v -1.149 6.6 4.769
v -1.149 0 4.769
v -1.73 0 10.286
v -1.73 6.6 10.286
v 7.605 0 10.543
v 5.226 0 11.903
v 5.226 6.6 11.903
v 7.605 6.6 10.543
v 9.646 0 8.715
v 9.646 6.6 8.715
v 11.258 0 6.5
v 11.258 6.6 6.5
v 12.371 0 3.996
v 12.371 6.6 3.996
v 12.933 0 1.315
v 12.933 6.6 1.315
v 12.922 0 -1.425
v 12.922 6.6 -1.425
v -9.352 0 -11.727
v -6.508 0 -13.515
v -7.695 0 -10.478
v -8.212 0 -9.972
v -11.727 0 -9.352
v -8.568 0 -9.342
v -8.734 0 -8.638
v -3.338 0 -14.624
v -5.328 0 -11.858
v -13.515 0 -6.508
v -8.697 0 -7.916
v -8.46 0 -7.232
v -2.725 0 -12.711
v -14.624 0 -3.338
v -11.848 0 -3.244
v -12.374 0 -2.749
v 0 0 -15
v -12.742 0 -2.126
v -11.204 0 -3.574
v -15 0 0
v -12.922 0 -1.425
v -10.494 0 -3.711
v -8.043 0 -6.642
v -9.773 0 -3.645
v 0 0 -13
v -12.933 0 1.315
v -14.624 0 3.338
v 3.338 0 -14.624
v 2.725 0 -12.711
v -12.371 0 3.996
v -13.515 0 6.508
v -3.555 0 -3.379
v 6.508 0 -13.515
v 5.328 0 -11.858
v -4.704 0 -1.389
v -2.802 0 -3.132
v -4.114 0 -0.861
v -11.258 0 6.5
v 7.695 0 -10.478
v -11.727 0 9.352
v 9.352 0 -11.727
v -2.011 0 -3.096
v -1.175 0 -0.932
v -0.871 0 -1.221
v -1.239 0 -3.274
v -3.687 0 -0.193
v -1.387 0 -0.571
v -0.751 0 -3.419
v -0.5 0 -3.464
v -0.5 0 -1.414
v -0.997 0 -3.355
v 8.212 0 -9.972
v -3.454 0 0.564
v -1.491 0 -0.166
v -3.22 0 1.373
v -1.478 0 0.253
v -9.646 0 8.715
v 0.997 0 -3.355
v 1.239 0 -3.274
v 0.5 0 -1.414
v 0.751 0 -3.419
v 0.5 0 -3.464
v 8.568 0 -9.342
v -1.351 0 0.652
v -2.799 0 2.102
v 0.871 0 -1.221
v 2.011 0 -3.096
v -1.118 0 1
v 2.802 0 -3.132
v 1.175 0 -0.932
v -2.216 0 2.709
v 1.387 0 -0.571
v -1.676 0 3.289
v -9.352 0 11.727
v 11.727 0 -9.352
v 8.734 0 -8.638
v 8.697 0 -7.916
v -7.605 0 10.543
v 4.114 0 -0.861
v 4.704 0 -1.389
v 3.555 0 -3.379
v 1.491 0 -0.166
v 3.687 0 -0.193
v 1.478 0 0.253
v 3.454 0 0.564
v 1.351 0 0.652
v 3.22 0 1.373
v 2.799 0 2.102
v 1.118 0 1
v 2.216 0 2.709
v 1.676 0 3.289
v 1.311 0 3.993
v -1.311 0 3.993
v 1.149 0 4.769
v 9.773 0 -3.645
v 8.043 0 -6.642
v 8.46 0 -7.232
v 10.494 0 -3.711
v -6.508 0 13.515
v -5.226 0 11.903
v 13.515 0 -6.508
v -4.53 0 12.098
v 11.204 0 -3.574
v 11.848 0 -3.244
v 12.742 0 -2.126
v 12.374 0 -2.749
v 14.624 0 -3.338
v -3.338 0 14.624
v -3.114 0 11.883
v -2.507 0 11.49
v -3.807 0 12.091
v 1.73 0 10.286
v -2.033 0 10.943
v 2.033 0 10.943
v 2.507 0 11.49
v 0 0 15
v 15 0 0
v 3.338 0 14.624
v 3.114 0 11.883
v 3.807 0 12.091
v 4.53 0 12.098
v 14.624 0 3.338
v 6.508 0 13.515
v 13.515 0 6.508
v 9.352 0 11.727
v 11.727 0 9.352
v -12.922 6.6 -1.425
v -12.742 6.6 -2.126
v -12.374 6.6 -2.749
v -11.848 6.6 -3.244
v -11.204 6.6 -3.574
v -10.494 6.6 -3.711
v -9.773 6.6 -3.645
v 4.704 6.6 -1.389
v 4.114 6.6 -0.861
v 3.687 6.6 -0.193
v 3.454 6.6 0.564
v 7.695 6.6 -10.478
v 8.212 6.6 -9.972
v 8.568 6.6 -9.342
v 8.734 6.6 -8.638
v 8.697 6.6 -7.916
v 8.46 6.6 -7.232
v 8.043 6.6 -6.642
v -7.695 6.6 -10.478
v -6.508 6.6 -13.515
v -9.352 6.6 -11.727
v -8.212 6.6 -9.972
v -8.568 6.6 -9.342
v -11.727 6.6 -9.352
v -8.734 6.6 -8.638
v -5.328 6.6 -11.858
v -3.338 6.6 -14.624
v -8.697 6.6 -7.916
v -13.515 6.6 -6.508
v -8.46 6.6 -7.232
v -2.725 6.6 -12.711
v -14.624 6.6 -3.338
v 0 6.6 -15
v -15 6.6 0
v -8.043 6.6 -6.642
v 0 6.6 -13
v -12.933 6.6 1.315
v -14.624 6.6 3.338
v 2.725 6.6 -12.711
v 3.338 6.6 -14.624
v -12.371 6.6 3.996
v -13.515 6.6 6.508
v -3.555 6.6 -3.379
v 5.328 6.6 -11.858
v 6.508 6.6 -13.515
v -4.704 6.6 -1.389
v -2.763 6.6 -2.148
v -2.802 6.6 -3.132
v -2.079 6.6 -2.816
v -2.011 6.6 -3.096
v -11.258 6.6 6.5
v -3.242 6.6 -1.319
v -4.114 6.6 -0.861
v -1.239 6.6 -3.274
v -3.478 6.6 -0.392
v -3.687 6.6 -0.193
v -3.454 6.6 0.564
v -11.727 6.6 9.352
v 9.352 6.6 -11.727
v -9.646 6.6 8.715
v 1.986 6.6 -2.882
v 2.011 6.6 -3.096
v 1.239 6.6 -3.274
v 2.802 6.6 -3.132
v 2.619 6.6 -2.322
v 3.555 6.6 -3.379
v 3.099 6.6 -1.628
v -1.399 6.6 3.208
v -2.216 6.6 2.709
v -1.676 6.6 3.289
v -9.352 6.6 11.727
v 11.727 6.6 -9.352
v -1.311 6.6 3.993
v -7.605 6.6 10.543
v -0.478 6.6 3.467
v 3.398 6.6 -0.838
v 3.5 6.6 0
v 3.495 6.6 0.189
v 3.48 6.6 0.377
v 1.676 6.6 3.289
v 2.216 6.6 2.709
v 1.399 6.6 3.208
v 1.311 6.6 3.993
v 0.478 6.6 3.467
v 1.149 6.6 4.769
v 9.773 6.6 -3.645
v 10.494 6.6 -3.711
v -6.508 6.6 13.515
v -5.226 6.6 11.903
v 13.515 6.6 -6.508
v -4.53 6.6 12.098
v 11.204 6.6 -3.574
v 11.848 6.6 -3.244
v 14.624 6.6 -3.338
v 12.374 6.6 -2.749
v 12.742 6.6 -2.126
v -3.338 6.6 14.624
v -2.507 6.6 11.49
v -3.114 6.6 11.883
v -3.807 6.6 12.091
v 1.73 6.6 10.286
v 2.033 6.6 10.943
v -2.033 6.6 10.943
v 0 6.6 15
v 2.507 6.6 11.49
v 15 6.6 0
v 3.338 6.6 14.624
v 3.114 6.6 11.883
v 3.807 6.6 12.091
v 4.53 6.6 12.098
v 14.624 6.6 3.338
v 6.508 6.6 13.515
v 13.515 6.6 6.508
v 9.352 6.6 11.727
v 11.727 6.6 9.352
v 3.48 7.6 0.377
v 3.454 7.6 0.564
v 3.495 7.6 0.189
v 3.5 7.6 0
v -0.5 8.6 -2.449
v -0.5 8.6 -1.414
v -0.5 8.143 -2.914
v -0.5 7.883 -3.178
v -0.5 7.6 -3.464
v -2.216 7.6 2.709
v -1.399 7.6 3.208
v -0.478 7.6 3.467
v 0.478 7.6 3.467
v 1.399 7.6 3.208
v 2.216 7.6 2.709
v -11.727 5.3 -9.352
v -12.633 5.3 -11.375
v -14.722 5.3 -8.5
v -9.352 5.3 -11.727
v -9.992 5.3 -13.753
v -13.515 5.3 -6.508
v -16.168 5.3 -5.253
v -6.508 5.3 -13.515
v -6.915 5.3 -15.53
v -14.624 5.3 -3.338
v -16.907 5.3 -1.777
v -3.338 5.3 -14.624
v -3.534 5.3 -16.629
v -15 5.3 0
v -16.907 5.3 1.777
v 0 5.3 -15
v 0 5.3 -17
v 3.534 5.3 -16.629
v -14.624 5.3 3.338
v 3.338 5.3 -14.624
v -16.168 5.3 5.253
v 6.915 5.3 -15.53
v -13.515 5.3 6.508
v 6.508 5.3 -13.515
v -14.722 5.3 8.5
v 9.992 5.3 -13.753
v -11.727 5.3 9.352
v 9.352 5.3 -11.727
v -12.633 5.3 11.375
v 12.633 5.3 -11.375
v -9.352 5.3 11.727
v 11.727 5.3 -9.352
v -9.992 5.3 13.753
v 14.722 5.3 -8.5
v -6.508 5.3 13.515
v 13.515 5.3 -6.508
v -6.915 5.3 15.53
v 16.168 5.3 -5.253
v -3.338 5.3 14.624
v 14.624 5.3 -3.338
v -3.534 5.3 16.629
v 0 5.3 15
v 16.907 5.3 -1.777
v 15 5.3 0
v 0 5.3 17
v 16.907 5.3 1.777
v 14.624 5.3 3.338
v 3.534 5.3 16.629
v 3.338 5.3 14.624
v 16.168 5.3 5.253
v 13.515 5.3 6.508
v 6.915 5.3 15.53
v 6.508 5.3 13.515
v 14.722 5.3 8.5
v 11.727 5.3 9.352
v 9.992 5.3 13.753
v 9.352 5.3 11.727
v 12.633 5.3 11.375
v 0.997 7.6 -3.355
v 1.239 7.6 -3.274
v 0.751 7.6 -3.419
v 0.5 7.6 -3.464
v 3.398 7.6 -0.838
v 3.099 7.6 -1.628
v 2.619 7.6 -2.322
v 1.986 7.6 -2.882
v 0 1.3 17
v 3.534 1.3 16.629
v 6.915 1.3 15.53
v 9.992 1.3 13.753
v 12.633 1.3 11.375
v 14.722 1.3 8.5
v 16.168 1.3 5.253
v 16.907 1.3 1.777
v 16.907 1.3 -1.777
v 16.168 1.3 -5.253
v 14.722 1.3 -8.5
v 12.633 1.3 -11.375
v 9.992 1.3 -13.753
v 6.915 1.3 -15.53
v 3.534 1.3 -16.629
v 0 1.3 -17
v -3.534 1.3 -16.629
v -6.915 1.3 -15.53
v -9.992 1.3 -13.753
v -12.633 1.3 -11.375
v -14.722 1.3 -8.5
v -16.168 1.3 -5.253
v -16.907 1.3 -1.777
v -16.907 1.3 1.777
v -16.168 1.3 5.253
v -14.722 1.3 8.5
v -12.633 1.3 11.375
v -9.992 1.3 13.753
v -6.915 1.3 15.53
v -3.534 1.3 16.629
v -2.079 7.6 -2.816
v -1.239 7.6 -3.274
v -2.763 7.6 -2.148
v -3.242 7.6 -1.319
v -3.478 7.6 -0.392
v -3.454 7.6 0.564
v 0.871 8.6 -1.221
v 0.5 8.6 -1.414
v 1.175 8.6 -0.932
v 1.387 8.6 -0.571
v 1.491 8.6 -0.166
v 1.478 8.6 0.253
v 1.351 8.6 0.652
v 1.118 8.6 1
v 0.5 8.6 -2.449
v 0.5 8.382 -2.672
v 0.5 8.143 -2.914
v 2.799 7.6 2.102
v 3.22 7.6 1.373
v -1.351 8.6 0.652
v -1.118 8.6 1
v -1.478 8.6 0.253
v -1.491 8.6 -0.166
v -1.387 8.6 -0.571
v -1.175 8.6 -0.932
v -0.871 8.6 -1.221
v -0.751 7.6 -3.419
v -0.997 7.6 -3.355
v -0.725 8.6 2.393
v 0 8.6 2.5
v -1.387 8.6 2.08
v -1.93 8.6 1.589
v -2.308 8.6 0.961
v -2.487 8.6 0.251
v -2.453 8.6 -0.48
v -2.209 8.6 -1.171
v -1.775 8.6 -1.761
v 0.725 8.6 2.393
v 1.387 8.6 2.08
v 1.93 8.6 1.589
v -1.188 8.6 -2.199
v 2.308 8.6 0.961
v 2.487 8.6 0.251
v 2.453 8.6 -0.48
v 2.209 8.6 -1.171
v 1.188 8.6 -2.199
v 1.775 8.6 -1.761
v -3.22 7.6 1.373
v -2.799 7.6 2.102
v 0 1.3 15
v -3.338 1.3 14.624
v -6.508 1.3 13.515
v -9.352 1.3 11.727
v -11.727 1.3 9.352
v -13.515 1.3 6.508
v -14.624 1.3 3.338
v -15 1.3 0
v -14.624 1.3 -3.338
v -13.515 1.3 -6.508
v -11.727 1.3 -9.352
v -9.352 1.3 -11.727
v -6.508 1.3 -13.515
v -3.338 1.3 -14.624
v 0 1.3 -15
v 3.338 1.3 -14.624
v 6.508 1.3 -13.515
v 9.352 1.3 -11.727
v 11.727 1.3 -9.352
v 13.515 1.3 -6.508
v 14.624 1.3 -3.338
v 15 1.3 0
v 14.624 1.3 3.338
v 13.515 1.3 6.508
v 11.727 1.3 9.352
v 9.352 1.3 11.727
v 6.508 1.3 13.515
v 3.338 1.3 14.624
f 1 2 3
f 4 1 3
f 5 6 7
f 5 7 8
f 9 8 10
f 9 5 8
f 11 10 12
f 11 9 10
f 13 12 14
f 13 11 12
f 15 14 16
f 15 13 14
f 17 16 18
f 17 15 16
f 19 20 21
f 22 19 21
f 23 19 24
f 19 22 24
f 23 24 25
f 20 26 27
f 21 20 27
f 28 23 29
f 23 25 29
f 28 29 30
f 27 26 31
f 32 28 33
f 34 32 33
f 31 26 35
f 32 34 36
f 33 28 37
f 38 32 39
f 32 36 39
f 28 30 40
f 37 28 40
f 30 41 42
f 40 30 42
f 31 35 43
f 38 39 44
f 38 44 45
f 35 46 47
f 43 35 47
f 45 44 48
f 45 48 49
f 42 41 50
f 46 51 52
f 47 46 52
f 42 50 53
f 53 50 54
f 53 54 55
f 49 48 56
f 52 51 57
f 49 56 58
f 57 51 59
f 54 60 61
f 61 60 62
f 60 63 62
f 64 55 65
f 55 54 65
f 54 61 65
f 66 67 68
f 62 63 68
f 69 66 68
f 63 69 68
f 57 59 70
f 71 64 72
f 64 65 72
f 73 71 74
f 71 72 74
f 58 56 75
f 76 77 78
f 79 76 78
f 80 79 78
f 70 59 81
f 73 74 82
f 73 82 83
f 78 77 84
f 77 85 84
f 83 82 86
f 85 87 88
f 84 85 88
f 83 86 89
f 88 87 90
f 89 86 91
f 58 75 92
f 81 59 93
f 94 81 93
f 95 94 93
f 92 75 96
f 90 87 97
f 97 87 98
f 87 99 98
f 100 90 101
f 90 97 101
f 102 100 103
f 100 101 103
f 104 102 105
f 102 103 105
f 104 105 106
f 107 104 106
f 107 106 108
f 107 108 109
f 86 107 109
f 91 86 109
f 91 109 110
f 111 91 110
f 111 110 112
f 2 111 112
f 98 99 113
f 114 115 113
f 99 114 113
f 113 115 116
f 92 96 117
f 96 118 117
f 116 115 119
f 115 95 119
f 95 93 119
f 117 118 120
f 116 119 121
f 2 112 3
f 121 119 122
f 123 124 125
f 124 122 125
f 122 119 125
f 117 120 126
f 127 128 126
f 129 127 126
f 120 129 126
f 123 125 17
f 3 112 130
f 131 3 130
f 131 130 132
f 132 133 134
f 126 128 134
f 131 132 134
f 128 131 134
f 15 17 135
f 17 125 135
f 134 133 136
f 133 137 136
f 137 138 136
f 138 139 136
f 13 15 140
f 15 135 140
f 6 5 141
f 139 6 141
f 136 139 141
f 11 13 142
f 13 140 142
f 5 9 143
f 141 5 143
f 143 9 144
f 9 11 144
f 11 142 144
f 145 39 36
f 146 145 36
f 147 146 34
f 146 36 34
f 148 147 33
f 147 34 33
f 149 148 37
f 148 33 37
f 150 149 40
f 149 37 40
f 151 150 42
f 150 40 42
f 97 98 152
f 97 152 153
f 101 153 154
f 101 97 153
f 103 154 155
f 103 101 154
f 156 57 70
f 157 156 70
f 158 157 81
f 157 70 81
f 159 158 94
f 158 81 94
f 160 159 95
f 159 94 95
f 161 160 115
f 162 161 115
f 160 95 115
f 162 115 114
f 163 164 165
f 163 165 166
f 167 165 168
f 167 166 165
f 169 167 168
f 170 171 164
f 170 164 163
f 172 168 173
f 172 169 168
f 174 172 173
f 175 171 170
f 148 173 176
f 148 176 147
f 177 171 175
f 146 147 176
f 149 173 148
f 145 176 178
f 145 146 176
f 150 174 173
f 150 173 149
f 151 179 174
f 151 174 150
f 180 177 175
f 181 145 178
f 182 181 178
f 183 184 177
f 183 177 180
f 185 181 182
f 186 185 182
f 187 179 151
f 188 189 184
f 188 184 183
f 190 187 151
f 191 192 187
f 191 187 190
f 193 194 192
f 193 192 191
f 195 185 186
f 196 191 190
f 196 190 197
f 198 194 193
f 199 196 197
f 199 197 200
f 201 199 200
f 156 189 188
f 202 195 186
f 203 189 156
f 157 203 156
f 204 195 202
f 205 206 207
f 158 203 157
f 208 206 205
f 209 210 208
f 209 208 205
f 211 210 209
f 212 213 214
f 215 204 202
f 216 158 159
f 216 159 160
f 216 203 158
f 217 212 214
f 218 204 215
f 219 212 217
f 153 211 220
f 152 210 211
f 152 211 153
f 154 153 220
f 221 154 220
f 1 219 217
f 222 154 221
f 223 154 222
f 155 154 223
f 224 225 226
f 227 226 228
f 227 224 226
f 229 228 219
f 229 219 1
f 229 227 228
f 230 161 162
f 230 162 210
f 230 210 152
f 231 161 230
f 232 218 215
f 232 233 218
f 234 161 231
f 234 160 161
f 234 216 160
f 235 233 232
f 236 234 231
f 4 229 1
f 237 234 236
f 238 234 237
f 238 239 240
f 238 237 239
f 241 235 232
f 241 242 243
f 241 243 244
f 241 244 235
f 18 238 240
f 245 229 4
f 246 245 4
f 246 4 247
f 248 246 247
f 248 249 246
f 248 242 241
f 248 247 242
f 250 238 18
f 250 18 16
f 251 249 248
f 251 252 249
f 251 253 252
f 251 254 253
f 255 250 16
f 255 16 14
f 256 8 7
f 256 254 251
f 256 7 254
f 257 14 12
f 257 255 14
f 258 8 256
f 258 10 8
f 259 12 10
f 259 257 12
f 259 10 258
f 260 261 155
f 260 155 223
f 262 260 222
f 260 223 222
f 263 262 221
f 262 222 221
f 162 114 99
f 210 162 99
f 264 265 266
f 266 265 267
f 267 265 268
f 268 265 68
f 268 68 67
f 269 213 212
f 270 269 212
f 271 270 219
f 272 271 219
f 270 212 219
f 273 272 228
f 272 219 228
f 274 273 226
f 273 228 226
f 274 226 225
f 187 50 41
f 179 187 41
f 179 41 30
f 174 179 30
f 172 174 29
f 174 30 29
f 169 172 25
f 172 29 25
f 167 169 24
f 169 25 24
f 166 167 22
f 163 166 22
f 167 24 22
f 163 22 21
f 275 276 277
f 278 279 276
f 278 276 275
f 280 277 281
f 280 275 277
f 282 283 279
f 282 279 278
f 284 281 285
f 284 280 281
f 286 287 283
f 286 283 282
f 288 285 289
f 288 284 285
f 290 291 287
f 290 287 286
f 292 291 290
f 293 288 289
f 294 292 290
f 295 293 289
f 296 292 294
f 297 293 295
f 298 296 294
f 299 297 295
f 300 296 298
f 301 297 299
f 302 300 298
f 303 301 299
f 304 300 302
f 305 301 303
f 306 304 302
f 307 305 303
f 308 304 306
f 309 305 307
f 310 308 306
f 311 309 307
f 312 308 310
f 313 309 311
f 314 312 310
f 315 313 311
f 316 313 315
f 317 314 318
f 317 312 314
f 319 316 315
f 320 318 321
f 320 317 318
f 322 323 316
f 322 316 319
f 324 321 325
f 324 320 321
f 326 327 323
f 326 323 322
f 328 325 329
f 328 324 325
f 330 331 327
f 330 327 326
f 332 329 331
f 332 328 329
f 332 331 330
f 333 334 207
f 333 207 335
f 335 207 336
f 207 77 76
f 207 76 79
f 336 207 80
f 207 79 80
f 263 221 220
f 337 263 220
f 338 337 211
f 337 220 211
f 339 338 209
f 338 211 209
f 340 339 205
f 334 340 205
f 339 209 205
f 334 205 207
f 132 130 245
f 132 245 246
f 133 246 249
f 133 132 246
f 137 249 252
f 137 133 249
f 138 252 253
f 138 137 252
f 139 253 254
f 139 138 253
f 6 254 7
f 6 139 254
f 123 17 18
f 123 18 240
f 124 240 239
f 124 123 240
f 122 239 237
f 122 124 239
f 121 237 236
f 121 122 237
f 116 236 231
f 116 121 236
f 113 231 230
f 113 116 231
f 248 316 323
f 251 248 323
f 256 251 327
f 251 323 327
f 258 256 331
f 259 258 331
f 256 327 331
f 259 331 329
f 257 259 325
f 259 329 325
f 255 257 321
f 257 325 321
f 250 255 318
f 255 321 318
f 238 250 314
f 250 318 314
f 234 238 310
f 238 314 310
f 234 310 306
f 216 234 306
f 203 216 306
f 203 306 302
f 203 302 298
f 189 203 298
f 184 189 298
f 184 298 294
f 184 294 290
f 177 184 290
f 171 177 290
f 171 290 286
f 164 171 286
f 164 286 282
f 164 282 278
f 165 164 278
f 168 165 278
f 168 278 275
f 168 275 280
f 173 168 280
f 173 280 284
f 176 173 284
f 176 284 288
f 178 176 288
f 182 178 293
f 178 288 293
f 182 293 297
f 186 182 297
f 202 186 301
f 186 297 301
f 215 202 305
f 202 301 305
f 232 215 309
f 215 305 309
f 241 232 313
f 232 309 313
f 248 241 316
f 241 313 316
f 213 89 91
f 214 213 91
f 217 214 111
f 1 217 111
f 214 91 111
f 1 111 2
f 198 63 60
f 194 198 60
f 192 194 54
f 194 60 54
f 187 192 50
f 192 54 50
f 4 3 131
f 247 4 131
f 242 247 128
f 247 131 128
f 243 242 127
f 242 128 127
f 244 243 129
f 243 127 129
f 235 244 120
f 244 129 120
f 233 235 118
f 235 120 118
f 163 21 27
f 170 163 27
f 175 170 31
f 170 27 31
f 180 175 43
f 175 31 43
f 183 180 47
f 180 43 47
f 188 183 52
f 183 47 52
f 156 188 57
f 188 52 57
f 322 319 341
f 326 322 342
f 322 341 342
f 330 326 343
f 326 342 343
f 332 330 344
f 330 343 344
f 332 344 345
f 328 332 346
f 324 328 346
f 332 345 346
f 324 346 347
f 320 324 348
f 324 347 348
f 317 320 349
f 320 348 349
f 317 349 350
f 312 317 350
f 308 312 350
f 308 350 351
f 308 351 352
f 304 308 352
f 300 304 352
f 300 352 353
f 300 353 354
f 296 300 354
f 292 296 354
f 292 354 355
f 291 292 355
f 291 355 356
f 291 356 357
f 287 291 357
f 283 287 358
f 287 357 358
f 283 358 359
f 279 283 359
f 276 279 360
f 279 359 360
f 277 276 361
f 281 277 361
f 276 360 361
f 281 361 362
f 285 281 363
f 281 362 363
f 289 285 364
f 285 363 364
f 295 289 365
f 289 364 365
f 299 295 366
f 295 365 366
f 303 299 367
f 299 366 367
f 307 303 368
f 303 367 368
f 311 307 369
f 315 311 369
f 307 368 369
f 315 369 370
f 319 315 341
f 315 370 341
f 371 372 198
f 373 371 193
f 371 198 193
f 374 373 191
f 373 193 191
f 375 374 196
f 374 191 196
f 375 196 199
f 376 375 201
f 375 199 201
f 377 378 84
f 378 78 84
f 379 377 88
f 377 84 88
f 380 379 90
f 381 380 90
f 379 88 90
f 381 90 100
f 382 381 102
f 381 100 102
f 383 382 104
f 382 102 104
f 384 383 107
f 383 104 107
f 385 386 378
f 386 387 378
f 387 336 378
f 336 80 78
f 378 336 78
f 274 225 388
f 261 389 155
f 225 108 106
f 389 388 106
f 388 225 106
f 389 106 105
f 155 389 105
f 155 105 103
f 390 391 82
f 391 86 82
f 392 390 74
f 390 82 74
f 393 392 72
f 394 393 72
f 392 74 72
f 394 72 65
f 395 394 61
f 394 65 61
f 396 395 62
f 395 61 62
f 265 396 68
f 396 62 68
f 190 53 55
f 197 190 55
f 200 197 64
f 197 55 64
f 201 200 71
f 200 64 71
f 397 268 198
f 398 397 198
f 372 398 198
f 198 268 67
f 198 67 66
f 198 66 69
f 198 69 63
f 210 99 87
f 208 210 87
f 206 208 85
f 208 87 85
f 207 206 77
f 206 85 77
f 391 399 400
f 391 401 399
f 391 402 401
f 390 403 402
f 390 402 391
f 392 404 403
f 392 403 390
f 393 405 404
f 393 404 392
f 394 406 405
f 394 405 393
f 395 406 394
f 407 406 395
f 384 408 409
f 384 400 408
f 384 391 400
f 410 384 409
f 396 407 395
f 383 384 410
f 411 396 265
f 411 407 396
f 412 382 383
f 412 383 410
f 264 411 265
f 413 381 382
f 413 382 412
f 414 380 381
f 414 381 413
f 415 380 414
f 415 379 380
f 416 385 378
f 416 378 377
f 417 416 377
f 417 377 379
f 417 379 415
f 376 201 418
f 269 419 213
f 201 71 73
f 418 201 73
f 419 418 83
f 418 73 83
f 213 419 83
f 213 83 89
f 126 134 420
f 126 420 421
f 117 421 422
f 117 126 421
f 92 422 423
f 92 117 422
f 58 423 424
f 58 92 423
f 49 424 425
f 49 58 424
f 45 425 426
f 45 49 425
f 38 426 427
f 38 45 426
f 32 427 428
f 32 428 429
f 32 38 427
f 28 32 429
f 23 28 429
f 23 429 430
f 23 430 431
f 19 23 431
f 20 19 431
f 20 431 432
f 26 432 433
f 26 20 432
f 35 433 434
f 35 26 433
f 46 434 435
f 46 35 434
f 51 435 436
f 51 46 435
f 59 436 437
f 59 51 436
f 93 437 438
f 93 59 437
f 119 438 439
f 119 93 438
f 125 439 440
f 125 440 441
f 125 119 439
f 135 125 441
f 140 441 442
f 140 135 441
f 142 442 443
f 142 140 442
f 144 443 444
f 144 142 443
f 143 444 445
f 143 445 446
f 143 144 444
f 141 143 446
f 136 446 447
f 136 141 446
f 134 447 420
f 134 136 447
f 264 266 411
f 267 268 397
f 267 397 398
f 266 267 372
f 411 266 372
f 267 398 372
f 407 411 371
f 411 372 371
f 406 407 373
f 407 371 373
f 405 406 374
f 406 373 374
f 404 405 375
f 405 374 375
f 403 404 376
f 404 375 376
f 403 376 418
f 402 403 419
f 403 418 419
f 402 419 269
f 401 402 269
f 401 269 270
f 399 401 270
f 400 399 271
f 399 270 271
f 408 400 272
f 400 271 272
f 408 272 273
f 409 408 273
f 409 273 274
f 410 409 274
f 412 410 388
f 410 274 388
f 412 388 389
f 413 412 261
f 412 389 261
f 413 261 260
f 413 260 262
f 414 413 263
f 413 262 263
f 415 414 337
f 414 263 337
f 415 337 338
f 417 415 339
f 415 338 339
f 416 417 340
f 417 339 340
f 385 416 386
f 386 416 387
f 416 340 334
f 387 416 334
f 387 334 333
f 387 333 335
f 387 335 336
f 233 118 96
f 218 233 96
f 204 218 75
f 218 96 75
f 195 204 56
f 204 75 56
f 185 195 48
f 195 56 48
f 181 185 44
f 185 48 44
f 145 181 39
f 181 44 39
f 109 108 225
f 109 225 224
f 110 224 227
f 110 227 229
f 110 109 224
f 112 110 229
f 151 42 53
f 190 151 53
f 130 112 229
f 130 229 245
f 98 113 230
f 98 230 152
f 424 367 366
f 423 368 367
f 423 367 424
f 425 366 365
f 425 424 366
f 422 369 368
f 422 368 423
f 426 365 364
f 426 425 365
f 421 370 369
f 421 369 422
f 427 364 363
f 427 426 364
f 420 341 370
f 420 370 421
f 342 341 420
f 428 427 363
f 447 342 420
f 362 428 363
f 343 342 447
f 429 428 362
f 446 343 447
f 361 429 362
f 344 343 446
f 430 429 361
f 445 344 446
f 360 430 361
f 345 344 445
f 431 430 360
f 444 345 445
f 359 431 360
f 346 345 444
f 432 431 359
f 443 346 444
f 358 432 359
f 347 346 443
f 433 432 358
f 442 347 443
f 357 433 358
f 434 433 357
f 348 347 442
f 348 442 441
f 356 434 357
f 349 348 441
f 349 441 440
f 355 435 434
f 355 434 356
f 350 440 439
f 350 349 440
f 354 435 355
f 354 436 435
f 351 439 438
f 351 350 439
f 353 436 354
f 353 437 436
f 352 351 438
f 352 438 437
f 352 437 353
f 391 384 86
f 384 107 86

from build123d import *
from build123d.topology import SkipClean

# Parameters (mm, degrees)
SKETCH_1_R          = 15
EXTRUDE_1_DEPTH     = 6.6
EXTRUDE_2_DEPTH     = 2
SKETCH_3_R          = 17
SKETCH_3_R_2        = 15
EXTRUDE_3_DEPTH     = 5.3
SKETCH_4_R          = 17
SKETCH_4_R_2        = 15
CUT_EXTRUDE_3_DEPTH = 1.3


with BuildPart() as part:
    # 草图1 → 凸台-拉伸1 (new body)
    with BuildSketch(Plane(origin=(0, 0, 0), x_dir=(1, 0, 0), z_dir=(0, 1, 0))):
        with Locations(Location((0, 0, 0), (0, 0, 270))):
            Circle(SKETCH_1_R)
        with BuildLine():
            Line((1.118033989, -1), (-1.118033989, -1))
            ThreePointArc((-1.118033989, -1), (-1.4531398, 0.37200097), (-0.5, 1.414213562))
            Line((-0.5, 1.414213562), (-0.5, 3.464101615))
            ThreePointArc((-0.5, 3.464101615), (-0.874472135, 3.388996678), (-1.23853126, 3.273536363))
            ThreePointArc((-1.23853126, 3.273536363), (-2.407810688, 3.08721539), (-3.555224024, 3.379401158))
            Line((-3.555224024, 3.379401158), (-8.04299568, 6.641703286))
            ThreePointArc((-8.04299568, 6.641703286), (-8.733606232, 8.638127636), (-7.69519148, 10.477787366))
            ThreePointArc((-7.69519148, 10.477787366), (0, 13), (7.69519148, 10.477787366))
            ThreePointArc((7.69519148, 10.477787366), (8.733606232, 8.638127636), (8.04299568, 6.641703286))
            Line((8.04299568, 6.641703286), (3.555224024, 3.379401158))
            ThreePointArc((3.555224024, 3.379401158), (2.407810688, 3.08721539), (1.23853126, 3.273536363))
            ThreePointArc((1.23853126, 3.273536363), (0.874472135, 3.388996678), (0.5, 3.464101615))
            Line((0.5, 3.464101615), (0.5, 1.414213562))
            ThreePointArc((0.5, 1.414213562), (1.4531398, 0.37200097), (1.118033989, -1))
        make_face(mode=Mode.SUBTRACT)
        with BuildLine():
            Line((-1.149035241, -4.7686149), (-1.73038593, -10.286290225))
            ThreePointArc((-1.73038593, -10.286290225), (-3.114034858, -11.882588681), (-5.226434294, -11.903124992))
            ThreePointArc((-5.226434294, -11.903124992), (-11.258330249, -6.5), (-12.921625774, 1.425337626))
            ThreePointArc((-12.921625774, 1.425337626), (-11.847641089, 3.244461045), (-9.77338161, 3.644586939))
            Line((-9.77338161, 3.644586939), (-4.704259264, 1.389213742))
            ThreePointArc((-4.704259264, 1.389213742), (-3.877512299, 0.541617529), (-3.45423128, -0.564168647))
            ThreePointArc((-3.45423128, -0.564168647), (-3.031088913, -1.75), (-2.21570002, -2.709367716))
            ThreePointArc((-2.21570002, -2.709367716), (-1.469701611, -3.628832918), (-1.149035241, -4.7686149))
        make_face(mode=Mode.SUBTRACT)
        with BuildLine():
            Line((1.149035241, -4.7686149), (1.73038593, -10.286290225))
            ThreePointArc((1.73038593, -10.286290225), (3.114034858, -11.882588681), (5.226434294, -11.903124992))
            ThreePointArc((5.226434294, -11.903124992), (11.258330249, -6.5), (12.921625774, 1.425337626))
            ThreePointArc((12.921625774, 1.425337626), (11.847641089, 3.244461045), (9.77338161, 3.644586939))
            Line((9.77338161, 3.644586939), (4.704259264, 1.389213742))
            ThreePointArc((4.704259264, 1.389213742), (3.877512299, 0.541617529), (3.45423128, -0.564168647))
            ThreePointArc((3.45423128, -0.564168647), (3.031088913, -1.75), (2.21570002, -2.709367716))
            ThreePointArc((2.21570002, -2.709367716), (1.469701611, -3.628832918), (1.149035241, -4.7686149))
        make_face(mode=Mode.SUBTRACT)
    extrude(amount=EXTRUDE_1_DEPTH)

    # 草图2 → 凸台-拉伸2 (add)
    with BuildSketch(Plane(origin=(0, 6.6, 0), x_dir=(1, 0, 0), z_dir=(0, 1, 0))):
        with BuildLine():
            ThreePointArc((3.45423128, -0.564168647), (3.488539055, -0.283011059), (3.5, 0))
            ThreePointArc((3.5, 0), (2.879657915, 1.989364294), (1.23853126, 3.273536363))
            ThreePointArc((1.23853126, 3.273536363), (0.874472135, 3.388996678), (0.5, 3.464101615))
            Line((0.5, 3.464101615), (0.5, 1.414213562))
            ThreePointArc((0.5, 1.414213562), (1.4531398, 0.37200097), (1.118033989, -1))
            Line((1.118033989, -1), (-1.118033989, -1))
            ThreePointArc((-1.118033989, -1), (-1.4531398, 0.37200097), (-0.5, 1.414213562))
            Line((-0.5, 1.414213562), (-0.5, 3.464101615))
            ThreePointArc((-0.5, 3.464101615), (-0.874472135, 3.388996678), (-1.23853126, 3.273536363))
            ThreePointArc((-1.23853126, 3.273536363), (-3.031088913, 1.75), (-3.45423128, -0.564168647))
            ThreePointArc((-3.45423128, -0.564168647), (-3.031088913, -1.75), (-2.21570002, -2.709367716))
            ThreePointArc((-2.21570002, -2.709367716), (0, -3.5), (2.21570002, -2.709367716))
            ThreePointArc((2.21570002, -2.709367716), (3.031088913, -1.75), (3.45423128, -0.564168647))
        make_face()
    extrude(amount=EXTRUDE_2_DEPTH)

    # 倒角1: read off the stored shape, not the designer's step
    # 倒角1 outline → 倒角1 (revolve, cut)
    with BuildSketch(Plane.XY):
        Polygon((3.5, 8.6), (2.5, 8.6), (3.5, 7.6), align=None)
    revolve(axis=Axis((0, 0, 0), (0, 1, 0)), mode=Mode.SUBTRACT)

    # 草图3 → 凸台-拉伸3 (add)
    with SkipClean():  # the faces are left unmerged after this step: merging them gives an invalid solid
        with BuildSketch(Plane(origin=(0, 0, 0), x_dir=(1, 0, 0), z_dir=(0, 1, 0))):
            with Locations(Location((0, 0, 0), (0, 0, 270))):
                Circle(SKETCH_3_R)
            with Locations(Location((0, 0, 0), (0, 0, 270))):
                Circle(SKETCH_3_R_2, mode=Mode.SUBTRACT)
        extrude(amount=EXTRUDE_3_DEPTH)

    # 草图4 → 切除-拉伸3 (cut)
    with SkipClean():  # the faces are left unmerged after this step: merging them gives an invalid solid
        with BuildSketch(Plane.XZ):
            with Locations(Location((0, 0, 0), (0, 0, 270))):
                Circle(SKETCH_4_R)
            with Locations(Location((0, 0, 0), (0, 0, 90))):
                Circle(SKETCH_4_R_2, mode=Mode.SUBTRACT)
        extrude(amount=-CUT_EXTRUDE_3_DEPTH, mode=Mode.SUBTRACT)


solid = part.part
